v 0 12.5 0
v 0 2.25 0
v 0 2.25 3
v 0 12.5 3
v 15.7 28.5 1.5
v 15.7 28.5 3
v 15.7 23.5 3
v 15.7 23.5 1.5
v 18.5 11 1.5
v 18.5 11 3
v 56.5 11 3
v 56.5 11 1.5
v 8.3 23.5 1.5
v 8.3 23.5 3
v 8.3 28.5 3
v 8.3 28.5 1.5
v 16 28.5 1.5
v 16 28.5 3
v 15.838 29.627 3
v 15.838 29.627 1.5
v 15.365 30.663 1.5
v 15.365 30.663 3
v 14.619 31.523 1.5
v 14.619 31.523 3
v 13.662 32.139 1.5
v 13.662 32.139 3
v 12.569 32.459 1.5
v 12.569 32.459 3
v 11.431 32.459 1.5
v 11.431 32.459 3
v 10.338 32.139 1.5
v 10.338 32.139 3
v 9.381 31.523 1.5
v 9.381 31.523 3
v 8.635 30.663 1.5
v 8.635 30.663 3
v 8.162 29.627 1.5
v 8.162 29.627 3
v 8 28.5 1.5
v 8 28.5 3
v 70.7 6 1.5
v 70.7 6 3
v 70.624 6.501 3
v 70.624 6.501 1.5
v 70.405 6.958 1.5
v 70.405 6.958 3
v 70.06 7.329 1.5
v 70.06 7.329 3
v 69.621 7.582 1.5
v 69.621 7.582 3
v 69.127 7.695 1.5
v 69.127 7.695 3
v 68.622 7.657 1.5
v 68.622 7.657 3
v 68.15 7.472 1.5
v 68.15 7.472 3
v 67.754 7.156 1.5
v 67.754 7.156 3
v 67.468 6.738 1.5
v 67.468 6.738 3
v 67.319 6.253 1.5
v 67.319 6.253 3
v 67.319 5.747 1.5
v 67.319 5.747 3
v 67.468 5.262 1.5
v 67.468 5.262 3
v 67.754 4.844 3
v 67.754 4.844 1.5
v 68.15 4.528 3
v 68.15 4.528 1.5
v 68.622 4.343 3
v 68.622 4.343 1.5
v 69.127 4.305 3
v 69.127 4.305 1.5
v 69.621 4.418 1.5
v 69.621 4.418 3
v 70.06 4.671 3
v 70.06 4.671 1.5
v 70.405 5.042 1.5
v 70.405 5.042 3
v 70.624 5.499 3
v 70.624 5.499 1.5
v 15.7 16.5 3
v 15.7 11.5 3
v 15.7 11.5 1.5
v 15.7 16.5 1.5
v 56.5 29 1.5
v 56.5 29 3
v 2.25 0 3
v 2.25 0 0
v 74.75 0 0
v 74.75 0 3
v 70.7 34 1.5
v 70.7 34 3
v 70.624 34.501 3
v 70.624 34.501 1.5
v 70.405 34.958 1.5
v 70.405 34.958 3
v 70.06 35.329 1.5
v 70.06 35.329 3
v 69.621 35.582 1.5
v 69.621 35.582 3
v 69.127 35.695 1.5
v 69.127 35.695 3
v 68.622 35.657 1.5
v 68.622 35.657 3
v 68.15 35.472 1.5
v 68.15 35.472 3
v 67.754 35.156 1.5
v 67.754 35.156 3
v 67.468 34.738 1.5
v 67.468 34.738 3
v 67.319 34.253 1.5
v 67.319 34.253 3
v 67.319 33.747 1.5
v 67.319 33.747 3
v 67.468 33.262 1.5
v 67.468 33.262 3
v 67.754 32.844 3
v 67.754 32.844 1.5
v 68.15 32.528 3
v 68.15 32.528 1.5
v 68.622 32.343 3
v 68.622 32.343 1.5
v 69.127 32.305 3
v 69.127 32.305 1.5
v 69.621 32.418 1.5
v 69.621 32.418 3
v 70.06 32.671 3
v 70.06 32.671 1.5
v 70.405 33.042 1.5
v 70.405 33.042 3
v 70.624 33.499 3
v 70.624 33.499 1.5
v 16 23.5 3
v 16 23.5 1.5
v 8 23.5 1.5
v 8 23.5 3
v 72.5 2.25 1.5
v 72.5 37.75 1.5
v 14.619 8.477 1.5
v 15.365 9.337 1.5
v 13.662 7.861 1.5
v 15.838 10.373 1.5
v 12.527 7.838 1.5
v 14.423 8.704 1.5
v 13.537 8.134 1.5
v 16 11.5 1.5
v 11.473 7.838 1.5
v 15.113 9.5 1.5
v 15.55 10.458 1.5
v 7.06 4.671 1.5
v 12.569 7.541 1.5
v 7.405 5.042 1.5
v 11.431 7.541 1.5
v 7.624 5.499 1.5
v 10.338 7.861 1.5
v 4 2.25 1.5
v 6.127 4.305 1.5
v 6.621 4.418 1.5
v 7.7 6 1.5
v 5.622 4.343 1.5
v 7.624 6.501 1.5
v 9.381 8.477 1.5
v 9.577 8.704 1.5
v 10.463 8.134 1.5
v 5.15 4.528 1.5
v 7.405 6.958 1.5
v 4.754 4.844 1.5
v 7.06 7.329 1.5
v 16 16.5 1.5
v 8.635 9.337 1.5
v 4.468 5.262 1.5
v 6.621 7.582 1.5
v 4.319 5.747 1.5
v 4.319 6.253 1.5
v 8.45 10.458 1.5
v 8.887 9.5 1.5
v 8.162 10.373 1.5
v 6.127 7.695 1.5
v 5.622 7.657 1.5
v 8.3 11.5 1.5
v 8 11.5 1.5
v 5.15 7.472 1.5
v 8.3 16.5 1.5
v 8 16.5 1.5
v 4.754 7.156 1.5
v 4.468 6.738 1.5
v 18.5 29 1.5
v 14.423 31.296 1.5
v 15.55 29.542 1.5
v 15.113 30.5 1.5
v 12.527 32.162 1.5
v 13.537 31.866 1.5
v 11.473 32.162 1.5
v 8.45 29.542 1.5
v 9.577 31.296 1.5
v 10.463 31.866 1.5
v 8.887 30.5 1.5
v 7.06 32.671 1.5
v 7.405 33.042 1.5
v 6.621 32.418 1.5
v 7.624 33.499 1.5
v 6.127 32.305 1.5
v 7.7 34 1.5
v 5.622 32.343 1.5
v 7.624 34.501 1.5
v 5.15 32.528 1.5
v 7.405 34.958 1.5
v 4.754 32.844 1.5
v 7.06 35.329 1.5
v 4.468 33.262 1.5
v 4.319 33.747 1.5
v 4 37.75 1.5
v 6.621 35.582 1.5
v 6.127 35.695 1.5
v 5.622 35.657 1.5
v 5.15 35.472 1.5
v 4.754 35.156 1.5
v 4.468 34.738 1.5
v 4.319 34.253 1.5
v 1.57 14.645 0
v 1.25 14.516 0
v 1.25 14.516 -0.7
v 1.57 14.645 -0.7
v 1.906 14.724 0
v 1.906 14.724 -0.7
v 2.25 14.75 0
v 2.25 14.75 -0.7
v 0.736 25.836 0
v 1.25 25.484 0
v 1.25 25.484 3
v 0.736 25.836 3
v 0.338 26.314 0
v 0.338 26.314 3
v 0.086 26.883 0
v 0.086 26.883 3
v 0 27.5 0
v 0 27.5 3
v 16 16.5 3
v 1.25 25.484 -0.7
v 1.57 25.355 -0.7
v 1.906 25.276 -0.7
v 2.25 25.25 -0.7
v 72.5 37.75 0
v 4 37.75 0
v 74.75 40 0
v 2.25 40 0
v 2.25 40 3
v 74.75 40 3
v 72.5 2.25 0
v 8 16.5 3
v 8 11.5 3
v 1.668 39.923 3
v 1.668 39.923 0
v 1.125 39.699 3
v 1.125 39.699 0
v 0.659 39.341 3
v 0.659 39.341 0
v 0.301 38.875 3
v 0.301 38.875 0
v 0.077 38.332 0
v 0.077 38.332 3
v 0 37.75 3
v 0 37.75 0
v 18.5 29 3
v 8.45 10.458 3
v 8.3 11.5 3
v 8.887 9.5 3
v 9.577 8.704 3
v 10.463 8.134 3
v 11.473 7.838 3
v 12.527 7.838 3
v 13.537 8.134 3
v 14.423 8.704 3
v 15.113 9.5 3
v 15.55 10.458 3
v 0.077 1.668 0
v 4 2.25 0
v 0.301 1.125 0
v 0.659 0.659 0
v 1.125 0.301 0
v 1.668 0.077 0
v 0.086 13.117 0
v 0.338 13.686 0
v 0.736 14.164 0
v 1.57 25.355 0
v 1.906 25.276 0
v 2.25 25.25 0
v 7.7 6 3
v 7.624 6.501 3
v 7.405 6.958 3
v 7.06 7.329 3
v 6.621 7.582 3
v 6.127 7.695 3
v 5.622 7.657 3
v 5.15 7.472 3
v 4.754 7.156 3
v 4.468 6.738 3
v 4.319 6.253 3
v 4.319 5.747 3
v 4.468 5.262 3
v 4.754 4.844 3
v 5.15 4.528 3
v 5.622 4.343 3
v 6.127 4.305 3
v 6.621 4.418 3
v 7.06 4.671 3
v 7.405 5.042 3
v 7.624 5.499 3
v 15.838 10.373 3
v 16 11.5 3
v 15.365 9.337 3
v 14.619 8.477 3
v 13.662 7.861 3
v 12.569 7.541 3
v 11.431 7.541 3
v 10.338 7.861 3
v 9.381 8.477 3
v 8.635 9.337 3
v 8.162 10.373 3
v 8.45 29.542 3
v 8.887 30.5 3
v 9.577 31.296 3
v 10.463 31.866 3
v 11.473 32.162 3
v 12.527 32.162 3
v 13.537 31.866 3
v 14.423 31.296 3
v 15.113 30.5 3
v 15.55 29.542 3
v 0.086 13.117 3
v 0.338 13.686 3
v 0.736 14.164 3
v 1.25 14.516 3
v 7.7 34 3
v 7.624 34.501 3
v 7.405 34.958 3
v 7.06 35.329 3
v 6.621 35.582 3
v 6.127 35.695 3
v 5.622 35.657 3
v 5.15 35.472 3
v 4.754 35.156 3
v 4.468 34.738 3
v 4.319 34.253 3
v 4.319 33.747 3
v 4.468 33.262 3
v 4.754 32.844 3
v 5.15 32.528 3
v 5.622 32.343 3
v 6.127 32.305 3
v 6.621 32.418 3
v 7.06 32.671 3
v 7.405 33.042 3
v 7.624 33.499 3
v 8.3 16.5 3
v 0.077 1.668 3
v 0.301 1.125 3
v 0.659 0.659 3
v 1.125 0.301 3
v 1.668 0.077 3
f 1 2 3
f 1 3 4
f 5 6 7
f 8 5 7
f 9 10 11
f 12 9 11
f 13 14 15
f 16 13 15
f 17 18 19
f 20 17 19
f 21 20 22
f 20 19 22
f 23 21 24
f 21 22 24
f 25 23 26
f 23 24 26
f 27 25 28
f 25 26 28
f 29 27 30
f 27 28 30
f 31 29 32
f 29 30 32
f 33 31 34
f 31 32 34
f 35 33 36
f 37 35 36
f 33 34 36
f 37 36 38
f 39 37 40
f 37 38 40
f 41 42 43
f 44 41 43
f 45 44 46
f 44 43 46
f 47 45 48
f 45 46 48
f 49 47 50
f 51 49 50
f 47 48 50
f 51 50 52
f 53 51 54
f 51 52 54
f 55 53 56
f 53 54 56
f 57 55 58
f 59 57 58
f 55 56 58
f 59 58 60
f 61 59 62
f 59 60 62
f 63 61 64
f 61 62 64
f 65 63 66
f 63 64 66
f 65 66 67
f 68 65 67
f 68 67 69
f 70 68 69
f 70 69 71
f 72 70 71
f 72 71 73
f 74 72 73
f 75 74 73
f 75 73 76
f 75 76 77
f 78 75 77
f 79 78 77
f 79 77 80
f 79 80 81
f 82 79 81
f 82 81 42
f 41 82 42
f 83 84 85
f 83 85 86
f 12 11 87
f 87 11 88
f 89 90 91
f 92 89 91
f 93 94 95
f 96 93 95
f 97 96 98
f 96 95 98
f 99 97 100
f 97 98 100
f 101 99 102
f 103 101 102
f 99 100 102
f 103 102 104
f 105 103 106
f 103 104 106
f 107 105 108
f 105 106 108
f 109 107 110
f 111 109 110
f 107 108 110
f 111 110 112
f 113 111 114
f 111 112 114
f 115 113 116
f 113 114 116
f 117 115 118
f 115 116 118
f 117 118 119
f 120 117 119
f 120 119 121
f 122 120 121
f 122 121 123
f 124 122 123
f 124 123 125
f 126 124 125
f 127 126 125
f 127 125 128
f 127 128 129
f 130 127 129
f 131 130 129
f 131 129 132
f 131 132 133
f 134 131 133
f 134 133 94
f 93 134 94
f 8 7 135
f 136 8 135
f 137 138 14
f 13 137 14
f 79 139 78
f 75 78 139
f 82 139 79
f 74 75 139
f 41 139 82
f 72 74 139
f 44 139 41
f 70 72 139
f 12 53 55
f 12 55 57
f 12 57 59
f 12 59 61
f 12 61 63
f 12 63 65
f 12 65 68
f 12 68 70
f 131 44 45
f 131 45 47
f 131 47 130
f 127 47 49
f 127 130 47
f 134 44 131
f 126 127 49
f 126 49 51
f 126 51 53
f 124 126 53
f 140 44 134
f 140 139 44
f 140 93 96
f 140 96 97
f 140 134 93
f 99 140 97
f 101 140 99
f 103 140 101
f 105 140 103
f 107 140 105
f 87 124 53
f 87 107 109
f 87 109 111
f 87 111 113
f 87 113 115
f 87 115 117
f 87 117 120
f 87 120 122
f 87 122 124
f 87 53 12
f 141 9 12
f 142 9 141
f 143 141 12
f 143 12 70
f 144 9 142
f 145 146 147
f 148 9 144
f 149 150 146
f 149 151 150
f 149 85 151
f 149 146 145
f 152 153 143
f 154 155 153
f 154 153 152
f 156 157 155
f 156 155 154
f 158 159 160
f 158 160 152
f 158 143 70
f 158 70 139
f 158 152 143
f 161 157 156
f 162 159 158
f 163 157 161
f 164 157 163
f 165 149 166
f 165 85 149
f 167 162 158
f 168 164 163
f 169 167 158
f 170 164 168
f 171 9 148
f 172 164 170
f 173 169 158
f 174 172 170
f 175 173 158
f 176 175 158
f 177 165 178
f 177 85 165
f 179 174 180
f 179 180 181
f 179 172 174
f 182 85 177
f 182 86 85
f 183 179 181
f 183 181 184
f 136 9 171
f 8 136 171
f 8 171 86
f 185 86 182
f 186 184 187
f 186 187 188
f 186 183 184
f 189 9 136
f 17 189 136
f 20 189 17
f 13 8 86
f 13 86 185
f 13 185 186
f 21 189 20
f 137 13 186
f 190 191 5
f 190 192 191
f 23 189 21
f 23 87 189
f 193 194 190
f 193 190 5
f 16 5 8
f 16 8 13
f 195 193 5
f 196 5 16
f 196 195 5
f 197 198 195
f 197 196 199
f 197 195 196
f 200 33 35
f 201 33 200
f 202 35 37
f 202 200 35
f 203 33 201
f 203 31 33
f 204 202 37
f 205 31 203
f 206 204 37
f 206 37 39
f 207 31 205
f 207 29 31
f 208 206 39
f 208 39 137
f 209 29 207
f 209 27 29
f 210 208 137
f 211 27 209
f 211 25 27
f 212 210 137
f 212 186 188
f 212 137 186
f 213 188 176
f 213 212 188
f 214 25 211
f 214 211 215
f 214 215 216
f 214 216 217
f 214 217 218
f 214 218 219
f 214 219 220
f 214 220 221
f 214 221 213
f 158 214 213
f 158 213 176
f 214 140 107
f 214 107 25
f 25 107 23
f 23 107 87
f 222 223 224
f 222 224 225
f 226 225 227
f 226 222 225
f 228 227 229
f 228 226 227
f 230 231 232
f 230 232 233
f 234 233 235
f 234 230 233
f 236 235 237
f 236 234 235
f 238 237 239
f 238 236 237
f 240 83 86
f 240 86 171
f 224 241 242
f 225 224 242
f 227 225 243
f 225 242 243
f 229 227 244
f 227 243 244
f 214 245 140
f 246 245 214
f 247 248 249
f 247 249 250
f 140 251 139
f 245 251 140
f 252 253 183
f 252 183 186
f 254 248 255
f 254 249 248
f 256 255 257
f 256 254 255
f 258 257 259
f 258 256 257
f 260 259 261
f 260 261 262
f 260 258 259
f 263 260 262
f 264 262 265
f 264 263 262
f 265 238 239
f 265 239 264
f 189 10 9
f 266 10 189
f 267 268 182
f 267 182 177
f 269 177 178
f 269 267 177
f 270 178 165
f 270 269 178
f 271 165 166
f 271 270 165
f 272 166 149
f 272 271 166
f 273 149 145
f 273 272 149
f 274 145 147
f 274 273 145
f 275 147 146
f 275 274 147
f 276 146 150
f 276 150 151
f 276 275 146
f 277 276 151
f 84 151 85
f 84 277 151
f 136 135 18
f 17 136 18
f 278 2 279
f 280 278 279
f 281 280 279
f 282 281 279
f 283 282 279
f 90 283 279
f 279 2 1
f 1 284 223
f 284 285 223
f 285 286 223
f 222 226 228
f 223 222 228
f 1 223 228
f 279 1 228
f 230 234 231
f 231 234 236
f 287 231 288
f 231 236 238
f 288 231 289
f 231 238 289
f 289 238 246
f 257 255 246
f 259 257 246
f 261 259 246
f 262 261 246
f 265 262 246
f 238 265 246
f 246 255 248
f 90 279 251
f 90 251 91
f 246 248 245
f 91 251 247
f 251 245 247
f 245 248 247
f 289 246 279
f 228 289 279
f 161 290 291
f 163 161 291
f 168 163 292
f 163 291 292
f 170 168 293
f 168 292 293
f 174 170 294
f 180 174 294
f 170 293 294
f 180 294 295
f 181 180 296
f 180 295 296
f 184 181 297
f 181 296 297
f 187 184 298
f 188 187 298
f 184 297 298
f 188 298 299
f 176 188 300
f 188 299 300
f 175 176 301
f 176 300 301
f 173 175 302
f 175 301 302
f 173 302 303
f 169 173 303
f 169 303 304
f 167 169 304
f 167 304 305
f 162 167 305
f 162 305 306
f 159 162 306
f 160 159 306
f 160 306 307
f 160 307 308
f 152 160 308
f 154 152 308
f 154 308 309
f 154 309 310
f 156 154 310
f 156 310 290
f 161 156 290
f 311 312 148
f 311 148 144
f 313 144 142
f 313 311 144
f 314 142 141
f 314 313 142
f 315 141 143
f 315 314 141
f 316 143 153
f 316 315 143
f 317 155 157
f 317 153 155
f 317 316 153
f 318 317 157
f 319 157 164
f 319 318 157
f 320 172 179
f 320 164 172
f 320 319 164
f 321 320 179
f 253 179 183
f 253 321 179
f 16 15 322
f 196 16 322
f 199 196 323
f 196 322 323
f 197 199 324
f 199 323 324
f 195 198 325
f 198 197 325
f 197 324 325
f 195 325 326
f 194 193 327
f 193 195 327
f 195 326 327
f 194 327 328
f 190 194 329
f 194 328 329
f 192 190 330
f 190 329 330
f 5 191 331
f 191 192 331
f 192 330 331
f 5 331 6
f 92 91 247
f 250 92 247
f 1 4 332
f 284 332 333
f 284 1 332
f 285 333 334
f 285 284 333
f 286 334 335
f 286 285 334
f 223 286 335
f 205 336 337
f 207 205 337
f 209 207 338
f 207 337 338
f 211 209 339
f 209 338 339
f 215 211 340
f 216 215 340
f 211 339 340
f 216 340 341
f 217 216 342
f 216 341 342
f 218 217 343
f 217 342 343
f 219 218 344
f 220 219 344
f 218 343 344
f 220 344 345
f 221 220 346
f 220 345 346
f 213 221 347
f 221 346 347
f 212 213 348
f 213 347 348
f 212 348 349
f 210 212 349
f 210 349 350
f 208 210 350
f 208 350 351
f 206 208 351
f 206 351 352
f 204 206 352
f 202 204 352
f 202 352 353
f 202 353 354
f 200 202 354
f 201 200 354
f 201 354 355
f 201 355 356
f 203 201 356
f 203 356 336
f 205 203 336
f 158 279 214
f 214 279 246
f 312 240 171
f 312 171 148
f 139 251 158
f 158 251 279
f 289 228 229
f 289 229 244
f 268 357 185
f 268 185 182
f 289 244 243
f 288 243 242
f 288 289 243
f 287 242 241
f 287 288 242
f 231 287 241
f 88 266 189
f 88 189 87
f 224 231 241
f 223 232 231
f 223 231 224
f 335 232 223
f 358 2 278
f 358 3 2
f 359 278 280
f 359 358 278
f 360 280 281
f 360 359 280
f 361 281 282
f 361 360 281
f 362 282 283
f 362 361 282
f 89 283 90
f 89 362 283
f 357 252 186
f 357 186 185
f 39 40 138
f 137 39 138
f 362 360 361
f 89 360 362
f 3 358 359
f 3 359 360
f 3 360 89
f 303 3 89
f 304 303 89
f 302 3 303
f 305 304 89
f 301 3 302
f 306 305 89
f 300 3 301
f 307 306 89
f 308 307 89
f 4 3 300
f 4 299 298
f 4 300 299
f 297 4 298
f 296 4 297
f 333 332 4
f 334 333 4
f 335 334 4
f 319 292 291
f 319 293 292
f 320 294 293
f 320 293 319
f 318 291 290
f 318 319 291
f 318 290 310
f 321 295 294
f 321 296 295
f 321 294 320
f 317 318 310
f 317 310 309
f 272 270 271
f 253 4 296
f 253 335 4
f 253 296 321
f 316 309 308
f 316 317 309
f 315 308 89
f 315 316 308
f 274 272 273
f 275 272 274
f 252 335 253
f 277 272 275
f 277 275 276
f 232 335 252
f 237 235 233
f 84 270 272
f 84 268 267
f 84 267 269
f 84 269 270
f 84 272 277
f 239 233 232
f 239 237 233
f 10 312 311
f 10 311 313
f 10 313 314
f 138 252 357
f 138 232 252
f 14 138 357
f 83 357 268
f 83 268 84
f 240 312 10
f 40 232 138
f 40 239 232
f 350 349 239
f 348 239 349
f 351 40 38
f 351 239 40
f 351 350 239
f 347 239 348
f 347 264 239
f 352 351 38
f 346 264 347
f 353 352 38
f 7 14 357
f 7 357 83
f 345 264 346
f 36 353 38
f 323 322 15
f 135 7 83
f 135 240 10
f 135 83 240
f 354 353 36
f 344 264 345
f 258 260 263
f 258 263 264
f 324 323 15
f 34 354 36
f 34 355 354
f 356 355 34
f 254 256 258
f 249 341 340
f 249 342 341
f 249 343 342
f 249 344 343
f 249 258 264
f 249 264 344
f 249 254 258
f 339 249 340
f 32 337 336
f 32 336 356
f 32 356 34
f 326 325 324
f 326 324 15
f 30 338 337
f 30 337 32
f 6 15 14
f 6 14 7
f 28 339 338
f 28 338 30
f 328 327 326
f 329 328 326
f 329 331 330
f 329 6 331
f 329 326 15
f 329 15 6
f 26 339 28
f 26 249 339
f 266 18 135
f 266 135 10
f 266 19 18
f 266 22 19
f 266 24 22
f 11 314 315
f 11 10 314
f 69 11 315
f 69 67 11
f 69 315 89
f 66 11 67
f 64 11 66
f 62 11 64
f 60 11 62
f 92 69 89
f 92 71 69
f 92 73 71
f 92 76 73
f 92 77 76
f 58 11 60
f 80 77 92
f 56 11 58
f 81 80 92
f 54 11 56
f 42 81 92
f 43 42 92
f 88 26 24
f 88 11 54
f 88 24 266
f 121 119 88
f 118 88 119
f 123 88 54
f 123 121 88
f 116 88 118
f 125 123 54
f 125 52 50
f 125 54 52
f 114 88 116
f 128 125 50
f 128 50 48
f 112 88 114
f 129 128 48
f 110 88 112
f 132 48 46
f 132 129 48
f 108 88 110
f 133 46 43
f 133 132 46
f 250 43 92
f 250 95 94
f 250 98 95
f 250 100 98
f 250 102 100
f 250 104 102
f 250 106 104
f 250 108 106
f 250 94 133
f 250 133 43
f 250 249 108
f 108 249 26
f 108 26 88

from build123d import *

# Parameters (mm, degrees)
SKETCH1_W           = 74.75
SKETCH1_H           = 40
BOSS_EXTRUDE1_DEPTH = 3
SKETCH2_W           = 2.25
SKETCH2_H           = 10.5
CUT_EXTRUDE1_DEPTH  = 85.832555661
FILLET2_R           = 2.25
FILLET1_R           = 2.25
BOSS_EXTRUDE4_DEPTH = 3.7
SKETCH7_W           = 68.5
SKETCH7_H           = 35.5
OLED_RECESS_DEPTH   = 1.5
SKETCH9_R           = 1.7
SKETCH9_W           = 38
SKETCH9_H           = 18
CUT_EXTRUDE5_DEPTH  = 85.860193848


with BuildPart() as part:
    # Sketch1 → Boss-Extrude1 (new body)
    with BuildSketch(Plane.XY):
        with Locations((37.375, 20)):
            Rectangle(SKETCH1_W, SKETCH1_H)
    extrude(amount=BOSS_EXTRUDE1_DEPTH)

    # Sketch2 → Cut-Extrude1 (cut, through all)
    with BuildSketch(Plane.XY.offset(3)):
        with Locations((1.125, 20)):
            Rectangle(SKETCH2_W, SKETCH2_H)
    extrude(amount=-CUT_EXTRUDE1_DEPTH, mode=Mode.SUBTRACT)

    # Fillet2
    fillet2_edges = [part.edges().sort_by_distance(p)[0] for p in [
        (0, 14.75, 1.5),
        (0, 25.25, 1.5),
    ]]
    fillet(fillet2_edges, radius=FILLET2_R - 0.0001)  # a hair under: the kernel refuses the full size

    # Fillet1
    fillet1_edges = [part.edges().sort_by_distance(p)[0] for p in [
        (0, 40, 1.5),
        (0, 0, 1.5),
    ]]
    fillet(fillet1_edges, radius=FILLET1_R)

    # Sketch6 → Boss-Extrude4 (add)
    with BuildSketch(Plane.XY.offset(3)):
        with BuildLine():
            Line((1.25, 25.484435563), (1.25, 14.515564437))
            ThreePointArc((1.25, 14.515564437), (1.736443763, 14.69060722), (2.25, 14.75))
            Line((2.25, 14.75), (2.25, 25.25))
            ThreePointArc((2.25, 25.25), (1.736443763, 25.30939278), (1.25, 25.484435563))
        make_face()
    extrude(amount=-BOSS_EXTRUDE4_DEPTH)

    # Sketch7 → oled-recess (cut)
    with BuildSketch(Plane(origin=(0, 0, 0), x_dir=(-1, 0, 0), z_dir=(0, 0, -1))):
        with Locations((-38.25, 20)):
            Rectangle(SKETCH7_W, SKETCH7_H)
    extrude(amount=-OLED_RECESS_DEPTH, mode=Mode.SUBTRACT)

    # Sketch9 → Cut-Extrude5 (cut, through all)
    with BuildSketch(Plane.XY.offset(3)):
        with Locations((6, 34)):
            Circle(SKETCH9_R)
        with Locations((69, 34)):
            Circle(SKETCH9_R)
        with Locations((6, 6)):
            Circle(SKETCH9_R)
        with Locations((69, 6)):
            Circle(SKETCH9_R)
        with Locations((37.5, 20)):
            Rectangle(SKETCH9_W, SKETCH9_H)
        with BuildLine():
            Line((8, 28.5), (8, 23.5))
            Line((8, 23.5), (8.3, 23.5))
            Line((8.3, 23.5), (8.3, 28.5))
            ThreePointArc((8.3, 28.5), (12, 32.2), (15.7, 28.5))
            Line((15.7, 28.5), (15.7, 23.5))
            Line((15.7, 23.5), (16, 23.5))
            Line((16, 23.5), (16, 28.5))
            ThreePointArc((16, 28.5), (12, 32.5), (8, 28.5))
        make_face()
        with BuildLine():
            Line((15.7, 16.5), (16, 16.5))
            Line((16, 16.5), (16, 11.5))
            ThreePointArc((16, 11.5), (12, 7.5), (8, 11.5))
            Line((8, 11.5), (8, 16.5))
            Line((8, 16.5), (8.3, 16.5))
            Line((8.3, 16.5), (8.3, 11.5))
            ThreePointArc((8.3, 11.5), (12, 7.8), (15.7, 11.5))
            Line((15.7, 11.5), (15.7, 16.5))
        make_face()
    extrude(amount=-CUT_EXTRUDE5_DEPTH, mode=Mode.SUBTRACT)


solid = part.part
